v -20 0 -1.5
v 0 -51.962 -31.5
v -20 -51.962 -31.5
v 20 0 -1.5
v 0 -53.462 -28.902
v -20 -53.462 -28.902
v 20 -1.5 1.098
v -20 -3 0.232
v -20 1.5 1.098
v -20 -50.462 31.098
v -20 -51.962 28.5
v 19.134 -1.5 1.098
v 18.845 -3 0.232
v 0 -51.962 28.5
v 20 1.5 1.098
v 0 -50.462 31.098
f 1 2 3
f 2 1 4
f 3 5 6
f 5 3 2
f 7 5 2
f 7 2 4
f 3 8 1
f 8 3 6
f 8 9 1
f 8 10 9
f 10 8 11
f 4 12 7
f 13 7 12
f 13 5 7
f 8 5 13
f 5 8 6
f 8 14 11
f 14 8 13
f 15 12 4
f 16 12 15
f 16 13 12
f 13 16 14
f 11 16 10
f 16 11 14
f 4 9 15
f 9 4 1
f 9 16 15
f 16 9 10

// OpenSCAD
///////////////////////////////////////////////////////////////////////////////
// Filename 	  	: SimpleWings.scad
// Main Module 	: Plane
// Sub-module 	: Wings
// Version  		: v1.0
// Category 		: Transportation
// Modified 		: 18 Sept 2016
// Author   		: Jason Yeo
///////////////////////////////////////////////////////////////////////////////
// Refer to drawing for Plane.pptx.
//
// A SIMPLE PLANE
// 
///////////////////////////////////////////////////////////////////////////////
$fn=180;
Wing();
//Wing(left=true);

module Wing(w1=20, w2=40, wingspan=120, t1=3, left=false)
{	
//	offset=computePoints(wingspan,left);
//	data=[[0,0],[0, offset], [w1,offset], [w2,0]];	
	color("Beige")
	if(left==false) {
		translate([-w2/2,0,-t1/2]) {
            rotate([+30,0,0])linear_extrude(t1) polygon([[0,0],[0, wingspan/-2], [w1,wingspan/-2], [w2,0]]);
            rotate([-30,0,0])linear_extrude(t1) polygon([[0,0],[0, wingspan/-2], [w1,wingspan/-2], [w2,0]]);
        }
	}	
	else {
		translate([-w2/2,0,-t1/2]) {
            rotate([+30,0,0])linear_extrude(t1) polygon([[0,0],[0, wingspan/2], [w1,wingspan/2], [w2,0]]);
            rotate([-30,0,0])linear_extrude(t1) polygon([[0,0],[0, wingspan/2], [w1,wingspan/2], [w2,0]]);
    }
	}
	
}

//function computePoints(wingspan,left)=(left ? wingspan/2 : wingspan/-2);
